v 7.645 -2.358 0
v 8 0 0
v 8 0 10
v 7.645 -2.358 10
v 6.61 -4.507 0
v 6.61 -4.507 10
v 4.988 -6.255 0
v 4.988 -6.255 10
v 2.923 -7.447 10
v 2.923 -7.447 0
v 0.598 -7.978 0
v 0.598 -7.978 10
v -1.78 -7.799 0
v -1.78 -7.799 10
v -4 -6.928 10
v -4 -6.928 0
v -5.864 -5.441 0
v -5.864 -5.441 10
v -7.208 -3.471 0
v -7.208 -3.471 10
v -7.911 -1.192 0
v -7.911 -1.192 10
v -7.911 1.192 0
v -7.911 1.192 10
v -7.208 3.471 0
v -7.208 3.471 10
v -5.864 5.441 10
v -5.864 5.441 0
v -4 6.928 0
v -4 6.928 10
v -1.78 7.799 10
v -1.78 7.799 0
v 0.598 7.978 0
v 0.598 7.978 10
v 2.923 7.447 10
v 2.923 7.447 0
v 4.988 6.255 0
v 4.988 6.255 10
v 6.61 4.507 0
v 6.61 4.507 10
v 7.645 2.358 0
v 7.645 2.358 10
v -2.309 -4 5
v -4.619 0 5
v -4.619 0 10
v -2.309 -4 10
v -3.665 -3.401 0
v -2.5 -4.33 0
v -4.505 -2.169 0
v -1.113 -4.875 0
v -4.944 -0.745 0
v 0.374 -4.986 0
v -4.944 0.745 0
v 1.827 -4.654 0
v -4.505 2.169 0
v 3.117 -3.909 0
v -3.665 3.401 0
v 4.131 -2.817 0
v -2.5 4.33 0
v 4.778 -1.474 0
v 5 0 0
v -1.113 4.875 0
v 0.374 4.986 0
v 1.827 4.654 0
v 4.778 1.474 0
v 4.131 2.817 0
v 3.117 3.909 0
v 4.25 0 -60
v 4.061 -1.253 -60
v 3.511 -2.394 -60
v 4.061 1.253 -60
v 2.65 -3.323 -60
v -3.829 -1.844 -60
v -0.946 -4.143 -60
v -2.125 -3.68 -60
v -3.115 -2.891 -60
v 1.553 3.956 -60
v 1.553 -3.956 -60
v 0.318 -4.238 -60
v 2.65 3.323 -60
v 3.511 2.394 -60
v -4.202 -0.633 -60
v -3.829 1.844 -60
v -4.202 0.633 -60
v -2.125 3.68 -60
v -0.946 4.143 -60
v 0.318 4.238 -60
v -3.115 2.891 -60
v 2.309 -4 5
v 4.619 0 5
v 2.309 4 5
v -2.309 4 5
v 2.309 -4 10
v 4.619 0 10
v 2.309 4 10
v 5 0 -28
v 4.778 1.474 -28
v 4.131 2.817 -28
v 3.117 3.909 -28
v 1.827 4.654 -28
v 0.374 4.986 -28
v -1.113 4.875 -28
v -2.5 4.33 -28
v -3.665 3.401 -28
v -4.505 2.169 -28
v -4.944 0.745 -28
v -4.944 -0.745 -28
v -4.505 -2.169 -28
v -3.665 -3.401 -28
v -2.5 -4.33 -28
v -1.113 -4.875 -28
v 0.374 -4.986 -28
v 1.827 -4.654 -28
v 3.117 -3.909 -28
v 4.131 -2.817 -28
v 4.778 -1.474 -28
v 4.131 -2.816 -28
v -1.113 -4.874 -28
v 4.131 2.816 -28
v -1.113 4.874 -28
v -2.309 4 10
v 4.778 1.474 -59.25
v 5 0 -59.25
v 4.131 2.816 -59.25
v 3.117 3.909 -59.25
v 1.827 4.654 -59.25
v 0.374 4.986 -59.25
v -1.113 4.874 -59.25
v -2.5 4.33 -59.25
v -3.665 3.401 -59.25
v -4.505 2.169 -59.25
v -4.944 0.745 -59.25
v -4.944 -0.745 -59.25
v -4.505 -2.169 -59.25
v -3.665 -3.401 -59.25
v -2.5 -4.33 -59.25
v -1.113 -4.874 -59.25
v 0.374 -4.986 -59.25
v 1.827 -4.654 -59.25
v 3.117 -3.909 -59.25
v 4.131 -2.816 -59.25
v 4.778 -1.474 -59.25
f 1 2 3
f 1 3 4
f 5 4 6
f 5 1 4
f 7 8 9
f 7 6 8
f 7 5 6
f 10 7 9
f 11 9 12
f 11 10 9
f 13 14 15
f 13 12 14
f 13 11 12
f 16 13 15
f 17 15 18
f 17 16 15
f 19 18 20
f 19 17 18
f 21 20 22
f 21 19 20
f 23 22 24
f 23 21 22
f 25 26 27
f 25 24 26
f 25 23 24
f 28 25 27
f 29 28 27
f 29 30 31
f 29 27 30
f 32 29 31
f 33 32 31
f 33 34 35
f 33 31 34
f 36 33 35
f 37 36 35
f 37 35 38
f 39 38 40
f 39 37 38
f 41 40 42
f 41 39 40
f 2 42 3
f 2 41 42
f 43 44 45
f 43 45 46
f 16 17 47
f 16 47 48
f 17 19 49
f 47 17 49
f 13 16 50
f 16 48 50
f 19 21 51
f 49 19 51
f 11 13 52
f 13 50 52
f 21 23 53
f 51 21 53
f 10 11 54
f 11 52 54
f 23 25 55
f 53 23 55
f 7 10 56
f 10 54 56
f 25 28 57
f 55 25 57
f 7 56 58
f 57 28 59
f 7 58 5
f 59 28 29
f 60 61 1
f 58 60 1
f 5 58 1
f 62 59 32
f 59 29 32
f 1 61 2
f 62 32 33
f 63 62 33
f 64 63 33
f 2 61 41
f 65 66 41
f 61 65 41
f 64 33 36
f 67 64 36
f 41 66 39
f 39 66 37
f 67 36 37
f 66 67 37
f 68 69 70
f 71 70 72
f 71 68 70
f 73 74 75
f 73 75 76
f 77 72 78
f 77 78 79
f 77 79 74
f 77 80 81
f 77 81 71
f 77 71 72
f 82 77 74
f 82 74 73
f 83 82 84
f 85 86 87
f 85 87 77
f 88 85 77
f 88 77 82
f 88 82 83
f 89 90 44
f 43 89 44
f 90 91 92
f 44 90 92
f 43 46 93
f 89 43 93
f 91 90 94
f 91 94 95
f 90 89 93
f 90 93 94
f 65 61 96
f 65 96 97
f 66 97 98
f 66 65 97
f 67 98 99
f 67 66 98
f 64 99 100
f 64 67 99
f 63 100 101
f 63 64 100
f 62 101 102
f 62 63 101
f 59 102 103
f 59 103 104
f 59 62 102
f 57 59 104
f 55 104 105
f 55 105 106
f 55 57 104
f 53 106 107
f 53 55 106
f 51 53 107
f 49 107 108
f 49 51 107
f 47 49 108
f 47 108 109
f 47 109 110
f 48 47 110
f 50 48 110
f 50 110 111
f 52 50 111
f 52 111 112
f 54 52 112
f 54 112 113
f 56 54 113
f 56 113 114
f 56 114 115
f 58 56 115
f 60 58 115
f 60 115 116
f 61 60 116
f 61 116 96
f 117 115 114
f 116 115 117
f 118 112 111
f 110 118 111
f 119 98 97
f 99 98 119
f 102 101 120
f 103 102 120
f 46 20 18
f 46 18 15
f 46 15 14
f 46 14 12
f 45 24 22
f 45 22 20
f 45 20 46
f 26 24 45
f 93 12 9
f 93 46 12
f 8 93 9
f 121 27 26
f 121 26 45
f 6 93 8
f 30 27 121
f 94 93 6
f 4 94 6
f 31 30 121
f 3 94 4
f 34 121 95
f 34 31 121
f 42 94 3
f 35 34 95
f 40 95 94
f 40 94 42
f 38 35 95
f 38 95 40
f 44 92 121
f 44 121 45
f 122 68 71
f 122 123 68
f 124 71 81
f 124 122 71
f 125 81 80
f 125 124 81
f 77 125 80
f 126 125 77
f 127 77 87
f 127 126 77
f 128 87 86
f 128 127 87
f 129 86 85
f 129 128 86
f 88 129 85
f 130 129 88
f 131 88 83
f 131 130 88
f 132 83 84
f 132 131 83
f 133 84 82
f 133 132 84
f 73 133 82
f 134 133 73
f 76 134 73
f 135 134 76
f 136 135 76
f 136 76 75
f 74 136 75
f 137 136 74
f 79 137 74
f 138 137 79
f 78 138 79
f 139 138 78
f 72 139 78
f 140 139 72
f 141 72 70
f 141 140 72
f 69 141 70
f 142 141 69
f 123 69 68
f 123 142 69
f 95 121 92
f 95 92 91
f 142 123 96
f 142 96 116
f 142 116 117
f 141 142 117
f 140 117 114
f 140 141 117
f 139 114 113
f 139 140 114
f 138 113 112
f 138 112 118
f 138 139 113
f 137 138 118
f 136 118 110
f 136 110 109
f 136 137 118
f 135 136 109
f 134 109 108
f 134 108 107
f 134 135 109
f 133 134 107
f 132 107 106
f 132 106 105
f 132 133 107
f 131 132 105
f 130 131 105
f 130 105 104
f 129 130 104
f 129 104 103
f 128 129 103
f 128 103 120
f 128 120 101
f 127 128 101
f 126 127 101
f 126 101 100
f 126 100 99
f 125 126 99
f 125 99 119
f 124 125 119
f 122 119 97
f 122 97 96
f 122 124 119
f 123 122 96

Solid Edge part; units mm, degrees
sketch "Sketch1" plane through (0, 0, 0) normal (0, 0, 1) x (1, 0, 0)
  circle A0 centre (0, 0) radius 8
  dimension "D1" = 16
extrude "Protrusion1" add sketch "Sketch1" along normal blind 10
sketch "Sketch2" plane through (0, 0, 0) normal (0, 0, -1) x (1, 0, 0)
  circle A0 centre (0, 0) radius 5
extrude "Protrusion2" add sketch "Sketch2" along normal blind 60
sketch "Sketch3" plane through (0, 0, -60) normal (0, 0, -1) x (1, 0, 0)
  circle A0 centre (0, 0) radius 4.9997
extrude "Cutout1" cut sketch "Sketch3" against normal blind 32 flip side to cut
chamfer "Chamfer_1" distance 0.75 angle 45 1 edges at (-4.9997, 0, -60)
sketch "Sketch4" plane through (0, 0, 10) normal (0, 0, 1) x (1, 0, 0)
  line L0 (-2.3094, 4) -> (2.3094, 4)
  line L1 (4.6188, 0) -> (2.3094, 4)
  line L2 (2.3094, -4) -> (4.6188, 0)
  line L3 (-2.3094, -4) -> (2.3094, -4)
  line L4 (-4.6188, 0) -> (-2.3094, -4)
  line L5 (-2.3094, 4) -> (-4.6188, 0)
  dimension "D1" = 8
extrude "Cutout2" cut sketch "Sketch4" against normal blind 5
properties part number "24104593"
